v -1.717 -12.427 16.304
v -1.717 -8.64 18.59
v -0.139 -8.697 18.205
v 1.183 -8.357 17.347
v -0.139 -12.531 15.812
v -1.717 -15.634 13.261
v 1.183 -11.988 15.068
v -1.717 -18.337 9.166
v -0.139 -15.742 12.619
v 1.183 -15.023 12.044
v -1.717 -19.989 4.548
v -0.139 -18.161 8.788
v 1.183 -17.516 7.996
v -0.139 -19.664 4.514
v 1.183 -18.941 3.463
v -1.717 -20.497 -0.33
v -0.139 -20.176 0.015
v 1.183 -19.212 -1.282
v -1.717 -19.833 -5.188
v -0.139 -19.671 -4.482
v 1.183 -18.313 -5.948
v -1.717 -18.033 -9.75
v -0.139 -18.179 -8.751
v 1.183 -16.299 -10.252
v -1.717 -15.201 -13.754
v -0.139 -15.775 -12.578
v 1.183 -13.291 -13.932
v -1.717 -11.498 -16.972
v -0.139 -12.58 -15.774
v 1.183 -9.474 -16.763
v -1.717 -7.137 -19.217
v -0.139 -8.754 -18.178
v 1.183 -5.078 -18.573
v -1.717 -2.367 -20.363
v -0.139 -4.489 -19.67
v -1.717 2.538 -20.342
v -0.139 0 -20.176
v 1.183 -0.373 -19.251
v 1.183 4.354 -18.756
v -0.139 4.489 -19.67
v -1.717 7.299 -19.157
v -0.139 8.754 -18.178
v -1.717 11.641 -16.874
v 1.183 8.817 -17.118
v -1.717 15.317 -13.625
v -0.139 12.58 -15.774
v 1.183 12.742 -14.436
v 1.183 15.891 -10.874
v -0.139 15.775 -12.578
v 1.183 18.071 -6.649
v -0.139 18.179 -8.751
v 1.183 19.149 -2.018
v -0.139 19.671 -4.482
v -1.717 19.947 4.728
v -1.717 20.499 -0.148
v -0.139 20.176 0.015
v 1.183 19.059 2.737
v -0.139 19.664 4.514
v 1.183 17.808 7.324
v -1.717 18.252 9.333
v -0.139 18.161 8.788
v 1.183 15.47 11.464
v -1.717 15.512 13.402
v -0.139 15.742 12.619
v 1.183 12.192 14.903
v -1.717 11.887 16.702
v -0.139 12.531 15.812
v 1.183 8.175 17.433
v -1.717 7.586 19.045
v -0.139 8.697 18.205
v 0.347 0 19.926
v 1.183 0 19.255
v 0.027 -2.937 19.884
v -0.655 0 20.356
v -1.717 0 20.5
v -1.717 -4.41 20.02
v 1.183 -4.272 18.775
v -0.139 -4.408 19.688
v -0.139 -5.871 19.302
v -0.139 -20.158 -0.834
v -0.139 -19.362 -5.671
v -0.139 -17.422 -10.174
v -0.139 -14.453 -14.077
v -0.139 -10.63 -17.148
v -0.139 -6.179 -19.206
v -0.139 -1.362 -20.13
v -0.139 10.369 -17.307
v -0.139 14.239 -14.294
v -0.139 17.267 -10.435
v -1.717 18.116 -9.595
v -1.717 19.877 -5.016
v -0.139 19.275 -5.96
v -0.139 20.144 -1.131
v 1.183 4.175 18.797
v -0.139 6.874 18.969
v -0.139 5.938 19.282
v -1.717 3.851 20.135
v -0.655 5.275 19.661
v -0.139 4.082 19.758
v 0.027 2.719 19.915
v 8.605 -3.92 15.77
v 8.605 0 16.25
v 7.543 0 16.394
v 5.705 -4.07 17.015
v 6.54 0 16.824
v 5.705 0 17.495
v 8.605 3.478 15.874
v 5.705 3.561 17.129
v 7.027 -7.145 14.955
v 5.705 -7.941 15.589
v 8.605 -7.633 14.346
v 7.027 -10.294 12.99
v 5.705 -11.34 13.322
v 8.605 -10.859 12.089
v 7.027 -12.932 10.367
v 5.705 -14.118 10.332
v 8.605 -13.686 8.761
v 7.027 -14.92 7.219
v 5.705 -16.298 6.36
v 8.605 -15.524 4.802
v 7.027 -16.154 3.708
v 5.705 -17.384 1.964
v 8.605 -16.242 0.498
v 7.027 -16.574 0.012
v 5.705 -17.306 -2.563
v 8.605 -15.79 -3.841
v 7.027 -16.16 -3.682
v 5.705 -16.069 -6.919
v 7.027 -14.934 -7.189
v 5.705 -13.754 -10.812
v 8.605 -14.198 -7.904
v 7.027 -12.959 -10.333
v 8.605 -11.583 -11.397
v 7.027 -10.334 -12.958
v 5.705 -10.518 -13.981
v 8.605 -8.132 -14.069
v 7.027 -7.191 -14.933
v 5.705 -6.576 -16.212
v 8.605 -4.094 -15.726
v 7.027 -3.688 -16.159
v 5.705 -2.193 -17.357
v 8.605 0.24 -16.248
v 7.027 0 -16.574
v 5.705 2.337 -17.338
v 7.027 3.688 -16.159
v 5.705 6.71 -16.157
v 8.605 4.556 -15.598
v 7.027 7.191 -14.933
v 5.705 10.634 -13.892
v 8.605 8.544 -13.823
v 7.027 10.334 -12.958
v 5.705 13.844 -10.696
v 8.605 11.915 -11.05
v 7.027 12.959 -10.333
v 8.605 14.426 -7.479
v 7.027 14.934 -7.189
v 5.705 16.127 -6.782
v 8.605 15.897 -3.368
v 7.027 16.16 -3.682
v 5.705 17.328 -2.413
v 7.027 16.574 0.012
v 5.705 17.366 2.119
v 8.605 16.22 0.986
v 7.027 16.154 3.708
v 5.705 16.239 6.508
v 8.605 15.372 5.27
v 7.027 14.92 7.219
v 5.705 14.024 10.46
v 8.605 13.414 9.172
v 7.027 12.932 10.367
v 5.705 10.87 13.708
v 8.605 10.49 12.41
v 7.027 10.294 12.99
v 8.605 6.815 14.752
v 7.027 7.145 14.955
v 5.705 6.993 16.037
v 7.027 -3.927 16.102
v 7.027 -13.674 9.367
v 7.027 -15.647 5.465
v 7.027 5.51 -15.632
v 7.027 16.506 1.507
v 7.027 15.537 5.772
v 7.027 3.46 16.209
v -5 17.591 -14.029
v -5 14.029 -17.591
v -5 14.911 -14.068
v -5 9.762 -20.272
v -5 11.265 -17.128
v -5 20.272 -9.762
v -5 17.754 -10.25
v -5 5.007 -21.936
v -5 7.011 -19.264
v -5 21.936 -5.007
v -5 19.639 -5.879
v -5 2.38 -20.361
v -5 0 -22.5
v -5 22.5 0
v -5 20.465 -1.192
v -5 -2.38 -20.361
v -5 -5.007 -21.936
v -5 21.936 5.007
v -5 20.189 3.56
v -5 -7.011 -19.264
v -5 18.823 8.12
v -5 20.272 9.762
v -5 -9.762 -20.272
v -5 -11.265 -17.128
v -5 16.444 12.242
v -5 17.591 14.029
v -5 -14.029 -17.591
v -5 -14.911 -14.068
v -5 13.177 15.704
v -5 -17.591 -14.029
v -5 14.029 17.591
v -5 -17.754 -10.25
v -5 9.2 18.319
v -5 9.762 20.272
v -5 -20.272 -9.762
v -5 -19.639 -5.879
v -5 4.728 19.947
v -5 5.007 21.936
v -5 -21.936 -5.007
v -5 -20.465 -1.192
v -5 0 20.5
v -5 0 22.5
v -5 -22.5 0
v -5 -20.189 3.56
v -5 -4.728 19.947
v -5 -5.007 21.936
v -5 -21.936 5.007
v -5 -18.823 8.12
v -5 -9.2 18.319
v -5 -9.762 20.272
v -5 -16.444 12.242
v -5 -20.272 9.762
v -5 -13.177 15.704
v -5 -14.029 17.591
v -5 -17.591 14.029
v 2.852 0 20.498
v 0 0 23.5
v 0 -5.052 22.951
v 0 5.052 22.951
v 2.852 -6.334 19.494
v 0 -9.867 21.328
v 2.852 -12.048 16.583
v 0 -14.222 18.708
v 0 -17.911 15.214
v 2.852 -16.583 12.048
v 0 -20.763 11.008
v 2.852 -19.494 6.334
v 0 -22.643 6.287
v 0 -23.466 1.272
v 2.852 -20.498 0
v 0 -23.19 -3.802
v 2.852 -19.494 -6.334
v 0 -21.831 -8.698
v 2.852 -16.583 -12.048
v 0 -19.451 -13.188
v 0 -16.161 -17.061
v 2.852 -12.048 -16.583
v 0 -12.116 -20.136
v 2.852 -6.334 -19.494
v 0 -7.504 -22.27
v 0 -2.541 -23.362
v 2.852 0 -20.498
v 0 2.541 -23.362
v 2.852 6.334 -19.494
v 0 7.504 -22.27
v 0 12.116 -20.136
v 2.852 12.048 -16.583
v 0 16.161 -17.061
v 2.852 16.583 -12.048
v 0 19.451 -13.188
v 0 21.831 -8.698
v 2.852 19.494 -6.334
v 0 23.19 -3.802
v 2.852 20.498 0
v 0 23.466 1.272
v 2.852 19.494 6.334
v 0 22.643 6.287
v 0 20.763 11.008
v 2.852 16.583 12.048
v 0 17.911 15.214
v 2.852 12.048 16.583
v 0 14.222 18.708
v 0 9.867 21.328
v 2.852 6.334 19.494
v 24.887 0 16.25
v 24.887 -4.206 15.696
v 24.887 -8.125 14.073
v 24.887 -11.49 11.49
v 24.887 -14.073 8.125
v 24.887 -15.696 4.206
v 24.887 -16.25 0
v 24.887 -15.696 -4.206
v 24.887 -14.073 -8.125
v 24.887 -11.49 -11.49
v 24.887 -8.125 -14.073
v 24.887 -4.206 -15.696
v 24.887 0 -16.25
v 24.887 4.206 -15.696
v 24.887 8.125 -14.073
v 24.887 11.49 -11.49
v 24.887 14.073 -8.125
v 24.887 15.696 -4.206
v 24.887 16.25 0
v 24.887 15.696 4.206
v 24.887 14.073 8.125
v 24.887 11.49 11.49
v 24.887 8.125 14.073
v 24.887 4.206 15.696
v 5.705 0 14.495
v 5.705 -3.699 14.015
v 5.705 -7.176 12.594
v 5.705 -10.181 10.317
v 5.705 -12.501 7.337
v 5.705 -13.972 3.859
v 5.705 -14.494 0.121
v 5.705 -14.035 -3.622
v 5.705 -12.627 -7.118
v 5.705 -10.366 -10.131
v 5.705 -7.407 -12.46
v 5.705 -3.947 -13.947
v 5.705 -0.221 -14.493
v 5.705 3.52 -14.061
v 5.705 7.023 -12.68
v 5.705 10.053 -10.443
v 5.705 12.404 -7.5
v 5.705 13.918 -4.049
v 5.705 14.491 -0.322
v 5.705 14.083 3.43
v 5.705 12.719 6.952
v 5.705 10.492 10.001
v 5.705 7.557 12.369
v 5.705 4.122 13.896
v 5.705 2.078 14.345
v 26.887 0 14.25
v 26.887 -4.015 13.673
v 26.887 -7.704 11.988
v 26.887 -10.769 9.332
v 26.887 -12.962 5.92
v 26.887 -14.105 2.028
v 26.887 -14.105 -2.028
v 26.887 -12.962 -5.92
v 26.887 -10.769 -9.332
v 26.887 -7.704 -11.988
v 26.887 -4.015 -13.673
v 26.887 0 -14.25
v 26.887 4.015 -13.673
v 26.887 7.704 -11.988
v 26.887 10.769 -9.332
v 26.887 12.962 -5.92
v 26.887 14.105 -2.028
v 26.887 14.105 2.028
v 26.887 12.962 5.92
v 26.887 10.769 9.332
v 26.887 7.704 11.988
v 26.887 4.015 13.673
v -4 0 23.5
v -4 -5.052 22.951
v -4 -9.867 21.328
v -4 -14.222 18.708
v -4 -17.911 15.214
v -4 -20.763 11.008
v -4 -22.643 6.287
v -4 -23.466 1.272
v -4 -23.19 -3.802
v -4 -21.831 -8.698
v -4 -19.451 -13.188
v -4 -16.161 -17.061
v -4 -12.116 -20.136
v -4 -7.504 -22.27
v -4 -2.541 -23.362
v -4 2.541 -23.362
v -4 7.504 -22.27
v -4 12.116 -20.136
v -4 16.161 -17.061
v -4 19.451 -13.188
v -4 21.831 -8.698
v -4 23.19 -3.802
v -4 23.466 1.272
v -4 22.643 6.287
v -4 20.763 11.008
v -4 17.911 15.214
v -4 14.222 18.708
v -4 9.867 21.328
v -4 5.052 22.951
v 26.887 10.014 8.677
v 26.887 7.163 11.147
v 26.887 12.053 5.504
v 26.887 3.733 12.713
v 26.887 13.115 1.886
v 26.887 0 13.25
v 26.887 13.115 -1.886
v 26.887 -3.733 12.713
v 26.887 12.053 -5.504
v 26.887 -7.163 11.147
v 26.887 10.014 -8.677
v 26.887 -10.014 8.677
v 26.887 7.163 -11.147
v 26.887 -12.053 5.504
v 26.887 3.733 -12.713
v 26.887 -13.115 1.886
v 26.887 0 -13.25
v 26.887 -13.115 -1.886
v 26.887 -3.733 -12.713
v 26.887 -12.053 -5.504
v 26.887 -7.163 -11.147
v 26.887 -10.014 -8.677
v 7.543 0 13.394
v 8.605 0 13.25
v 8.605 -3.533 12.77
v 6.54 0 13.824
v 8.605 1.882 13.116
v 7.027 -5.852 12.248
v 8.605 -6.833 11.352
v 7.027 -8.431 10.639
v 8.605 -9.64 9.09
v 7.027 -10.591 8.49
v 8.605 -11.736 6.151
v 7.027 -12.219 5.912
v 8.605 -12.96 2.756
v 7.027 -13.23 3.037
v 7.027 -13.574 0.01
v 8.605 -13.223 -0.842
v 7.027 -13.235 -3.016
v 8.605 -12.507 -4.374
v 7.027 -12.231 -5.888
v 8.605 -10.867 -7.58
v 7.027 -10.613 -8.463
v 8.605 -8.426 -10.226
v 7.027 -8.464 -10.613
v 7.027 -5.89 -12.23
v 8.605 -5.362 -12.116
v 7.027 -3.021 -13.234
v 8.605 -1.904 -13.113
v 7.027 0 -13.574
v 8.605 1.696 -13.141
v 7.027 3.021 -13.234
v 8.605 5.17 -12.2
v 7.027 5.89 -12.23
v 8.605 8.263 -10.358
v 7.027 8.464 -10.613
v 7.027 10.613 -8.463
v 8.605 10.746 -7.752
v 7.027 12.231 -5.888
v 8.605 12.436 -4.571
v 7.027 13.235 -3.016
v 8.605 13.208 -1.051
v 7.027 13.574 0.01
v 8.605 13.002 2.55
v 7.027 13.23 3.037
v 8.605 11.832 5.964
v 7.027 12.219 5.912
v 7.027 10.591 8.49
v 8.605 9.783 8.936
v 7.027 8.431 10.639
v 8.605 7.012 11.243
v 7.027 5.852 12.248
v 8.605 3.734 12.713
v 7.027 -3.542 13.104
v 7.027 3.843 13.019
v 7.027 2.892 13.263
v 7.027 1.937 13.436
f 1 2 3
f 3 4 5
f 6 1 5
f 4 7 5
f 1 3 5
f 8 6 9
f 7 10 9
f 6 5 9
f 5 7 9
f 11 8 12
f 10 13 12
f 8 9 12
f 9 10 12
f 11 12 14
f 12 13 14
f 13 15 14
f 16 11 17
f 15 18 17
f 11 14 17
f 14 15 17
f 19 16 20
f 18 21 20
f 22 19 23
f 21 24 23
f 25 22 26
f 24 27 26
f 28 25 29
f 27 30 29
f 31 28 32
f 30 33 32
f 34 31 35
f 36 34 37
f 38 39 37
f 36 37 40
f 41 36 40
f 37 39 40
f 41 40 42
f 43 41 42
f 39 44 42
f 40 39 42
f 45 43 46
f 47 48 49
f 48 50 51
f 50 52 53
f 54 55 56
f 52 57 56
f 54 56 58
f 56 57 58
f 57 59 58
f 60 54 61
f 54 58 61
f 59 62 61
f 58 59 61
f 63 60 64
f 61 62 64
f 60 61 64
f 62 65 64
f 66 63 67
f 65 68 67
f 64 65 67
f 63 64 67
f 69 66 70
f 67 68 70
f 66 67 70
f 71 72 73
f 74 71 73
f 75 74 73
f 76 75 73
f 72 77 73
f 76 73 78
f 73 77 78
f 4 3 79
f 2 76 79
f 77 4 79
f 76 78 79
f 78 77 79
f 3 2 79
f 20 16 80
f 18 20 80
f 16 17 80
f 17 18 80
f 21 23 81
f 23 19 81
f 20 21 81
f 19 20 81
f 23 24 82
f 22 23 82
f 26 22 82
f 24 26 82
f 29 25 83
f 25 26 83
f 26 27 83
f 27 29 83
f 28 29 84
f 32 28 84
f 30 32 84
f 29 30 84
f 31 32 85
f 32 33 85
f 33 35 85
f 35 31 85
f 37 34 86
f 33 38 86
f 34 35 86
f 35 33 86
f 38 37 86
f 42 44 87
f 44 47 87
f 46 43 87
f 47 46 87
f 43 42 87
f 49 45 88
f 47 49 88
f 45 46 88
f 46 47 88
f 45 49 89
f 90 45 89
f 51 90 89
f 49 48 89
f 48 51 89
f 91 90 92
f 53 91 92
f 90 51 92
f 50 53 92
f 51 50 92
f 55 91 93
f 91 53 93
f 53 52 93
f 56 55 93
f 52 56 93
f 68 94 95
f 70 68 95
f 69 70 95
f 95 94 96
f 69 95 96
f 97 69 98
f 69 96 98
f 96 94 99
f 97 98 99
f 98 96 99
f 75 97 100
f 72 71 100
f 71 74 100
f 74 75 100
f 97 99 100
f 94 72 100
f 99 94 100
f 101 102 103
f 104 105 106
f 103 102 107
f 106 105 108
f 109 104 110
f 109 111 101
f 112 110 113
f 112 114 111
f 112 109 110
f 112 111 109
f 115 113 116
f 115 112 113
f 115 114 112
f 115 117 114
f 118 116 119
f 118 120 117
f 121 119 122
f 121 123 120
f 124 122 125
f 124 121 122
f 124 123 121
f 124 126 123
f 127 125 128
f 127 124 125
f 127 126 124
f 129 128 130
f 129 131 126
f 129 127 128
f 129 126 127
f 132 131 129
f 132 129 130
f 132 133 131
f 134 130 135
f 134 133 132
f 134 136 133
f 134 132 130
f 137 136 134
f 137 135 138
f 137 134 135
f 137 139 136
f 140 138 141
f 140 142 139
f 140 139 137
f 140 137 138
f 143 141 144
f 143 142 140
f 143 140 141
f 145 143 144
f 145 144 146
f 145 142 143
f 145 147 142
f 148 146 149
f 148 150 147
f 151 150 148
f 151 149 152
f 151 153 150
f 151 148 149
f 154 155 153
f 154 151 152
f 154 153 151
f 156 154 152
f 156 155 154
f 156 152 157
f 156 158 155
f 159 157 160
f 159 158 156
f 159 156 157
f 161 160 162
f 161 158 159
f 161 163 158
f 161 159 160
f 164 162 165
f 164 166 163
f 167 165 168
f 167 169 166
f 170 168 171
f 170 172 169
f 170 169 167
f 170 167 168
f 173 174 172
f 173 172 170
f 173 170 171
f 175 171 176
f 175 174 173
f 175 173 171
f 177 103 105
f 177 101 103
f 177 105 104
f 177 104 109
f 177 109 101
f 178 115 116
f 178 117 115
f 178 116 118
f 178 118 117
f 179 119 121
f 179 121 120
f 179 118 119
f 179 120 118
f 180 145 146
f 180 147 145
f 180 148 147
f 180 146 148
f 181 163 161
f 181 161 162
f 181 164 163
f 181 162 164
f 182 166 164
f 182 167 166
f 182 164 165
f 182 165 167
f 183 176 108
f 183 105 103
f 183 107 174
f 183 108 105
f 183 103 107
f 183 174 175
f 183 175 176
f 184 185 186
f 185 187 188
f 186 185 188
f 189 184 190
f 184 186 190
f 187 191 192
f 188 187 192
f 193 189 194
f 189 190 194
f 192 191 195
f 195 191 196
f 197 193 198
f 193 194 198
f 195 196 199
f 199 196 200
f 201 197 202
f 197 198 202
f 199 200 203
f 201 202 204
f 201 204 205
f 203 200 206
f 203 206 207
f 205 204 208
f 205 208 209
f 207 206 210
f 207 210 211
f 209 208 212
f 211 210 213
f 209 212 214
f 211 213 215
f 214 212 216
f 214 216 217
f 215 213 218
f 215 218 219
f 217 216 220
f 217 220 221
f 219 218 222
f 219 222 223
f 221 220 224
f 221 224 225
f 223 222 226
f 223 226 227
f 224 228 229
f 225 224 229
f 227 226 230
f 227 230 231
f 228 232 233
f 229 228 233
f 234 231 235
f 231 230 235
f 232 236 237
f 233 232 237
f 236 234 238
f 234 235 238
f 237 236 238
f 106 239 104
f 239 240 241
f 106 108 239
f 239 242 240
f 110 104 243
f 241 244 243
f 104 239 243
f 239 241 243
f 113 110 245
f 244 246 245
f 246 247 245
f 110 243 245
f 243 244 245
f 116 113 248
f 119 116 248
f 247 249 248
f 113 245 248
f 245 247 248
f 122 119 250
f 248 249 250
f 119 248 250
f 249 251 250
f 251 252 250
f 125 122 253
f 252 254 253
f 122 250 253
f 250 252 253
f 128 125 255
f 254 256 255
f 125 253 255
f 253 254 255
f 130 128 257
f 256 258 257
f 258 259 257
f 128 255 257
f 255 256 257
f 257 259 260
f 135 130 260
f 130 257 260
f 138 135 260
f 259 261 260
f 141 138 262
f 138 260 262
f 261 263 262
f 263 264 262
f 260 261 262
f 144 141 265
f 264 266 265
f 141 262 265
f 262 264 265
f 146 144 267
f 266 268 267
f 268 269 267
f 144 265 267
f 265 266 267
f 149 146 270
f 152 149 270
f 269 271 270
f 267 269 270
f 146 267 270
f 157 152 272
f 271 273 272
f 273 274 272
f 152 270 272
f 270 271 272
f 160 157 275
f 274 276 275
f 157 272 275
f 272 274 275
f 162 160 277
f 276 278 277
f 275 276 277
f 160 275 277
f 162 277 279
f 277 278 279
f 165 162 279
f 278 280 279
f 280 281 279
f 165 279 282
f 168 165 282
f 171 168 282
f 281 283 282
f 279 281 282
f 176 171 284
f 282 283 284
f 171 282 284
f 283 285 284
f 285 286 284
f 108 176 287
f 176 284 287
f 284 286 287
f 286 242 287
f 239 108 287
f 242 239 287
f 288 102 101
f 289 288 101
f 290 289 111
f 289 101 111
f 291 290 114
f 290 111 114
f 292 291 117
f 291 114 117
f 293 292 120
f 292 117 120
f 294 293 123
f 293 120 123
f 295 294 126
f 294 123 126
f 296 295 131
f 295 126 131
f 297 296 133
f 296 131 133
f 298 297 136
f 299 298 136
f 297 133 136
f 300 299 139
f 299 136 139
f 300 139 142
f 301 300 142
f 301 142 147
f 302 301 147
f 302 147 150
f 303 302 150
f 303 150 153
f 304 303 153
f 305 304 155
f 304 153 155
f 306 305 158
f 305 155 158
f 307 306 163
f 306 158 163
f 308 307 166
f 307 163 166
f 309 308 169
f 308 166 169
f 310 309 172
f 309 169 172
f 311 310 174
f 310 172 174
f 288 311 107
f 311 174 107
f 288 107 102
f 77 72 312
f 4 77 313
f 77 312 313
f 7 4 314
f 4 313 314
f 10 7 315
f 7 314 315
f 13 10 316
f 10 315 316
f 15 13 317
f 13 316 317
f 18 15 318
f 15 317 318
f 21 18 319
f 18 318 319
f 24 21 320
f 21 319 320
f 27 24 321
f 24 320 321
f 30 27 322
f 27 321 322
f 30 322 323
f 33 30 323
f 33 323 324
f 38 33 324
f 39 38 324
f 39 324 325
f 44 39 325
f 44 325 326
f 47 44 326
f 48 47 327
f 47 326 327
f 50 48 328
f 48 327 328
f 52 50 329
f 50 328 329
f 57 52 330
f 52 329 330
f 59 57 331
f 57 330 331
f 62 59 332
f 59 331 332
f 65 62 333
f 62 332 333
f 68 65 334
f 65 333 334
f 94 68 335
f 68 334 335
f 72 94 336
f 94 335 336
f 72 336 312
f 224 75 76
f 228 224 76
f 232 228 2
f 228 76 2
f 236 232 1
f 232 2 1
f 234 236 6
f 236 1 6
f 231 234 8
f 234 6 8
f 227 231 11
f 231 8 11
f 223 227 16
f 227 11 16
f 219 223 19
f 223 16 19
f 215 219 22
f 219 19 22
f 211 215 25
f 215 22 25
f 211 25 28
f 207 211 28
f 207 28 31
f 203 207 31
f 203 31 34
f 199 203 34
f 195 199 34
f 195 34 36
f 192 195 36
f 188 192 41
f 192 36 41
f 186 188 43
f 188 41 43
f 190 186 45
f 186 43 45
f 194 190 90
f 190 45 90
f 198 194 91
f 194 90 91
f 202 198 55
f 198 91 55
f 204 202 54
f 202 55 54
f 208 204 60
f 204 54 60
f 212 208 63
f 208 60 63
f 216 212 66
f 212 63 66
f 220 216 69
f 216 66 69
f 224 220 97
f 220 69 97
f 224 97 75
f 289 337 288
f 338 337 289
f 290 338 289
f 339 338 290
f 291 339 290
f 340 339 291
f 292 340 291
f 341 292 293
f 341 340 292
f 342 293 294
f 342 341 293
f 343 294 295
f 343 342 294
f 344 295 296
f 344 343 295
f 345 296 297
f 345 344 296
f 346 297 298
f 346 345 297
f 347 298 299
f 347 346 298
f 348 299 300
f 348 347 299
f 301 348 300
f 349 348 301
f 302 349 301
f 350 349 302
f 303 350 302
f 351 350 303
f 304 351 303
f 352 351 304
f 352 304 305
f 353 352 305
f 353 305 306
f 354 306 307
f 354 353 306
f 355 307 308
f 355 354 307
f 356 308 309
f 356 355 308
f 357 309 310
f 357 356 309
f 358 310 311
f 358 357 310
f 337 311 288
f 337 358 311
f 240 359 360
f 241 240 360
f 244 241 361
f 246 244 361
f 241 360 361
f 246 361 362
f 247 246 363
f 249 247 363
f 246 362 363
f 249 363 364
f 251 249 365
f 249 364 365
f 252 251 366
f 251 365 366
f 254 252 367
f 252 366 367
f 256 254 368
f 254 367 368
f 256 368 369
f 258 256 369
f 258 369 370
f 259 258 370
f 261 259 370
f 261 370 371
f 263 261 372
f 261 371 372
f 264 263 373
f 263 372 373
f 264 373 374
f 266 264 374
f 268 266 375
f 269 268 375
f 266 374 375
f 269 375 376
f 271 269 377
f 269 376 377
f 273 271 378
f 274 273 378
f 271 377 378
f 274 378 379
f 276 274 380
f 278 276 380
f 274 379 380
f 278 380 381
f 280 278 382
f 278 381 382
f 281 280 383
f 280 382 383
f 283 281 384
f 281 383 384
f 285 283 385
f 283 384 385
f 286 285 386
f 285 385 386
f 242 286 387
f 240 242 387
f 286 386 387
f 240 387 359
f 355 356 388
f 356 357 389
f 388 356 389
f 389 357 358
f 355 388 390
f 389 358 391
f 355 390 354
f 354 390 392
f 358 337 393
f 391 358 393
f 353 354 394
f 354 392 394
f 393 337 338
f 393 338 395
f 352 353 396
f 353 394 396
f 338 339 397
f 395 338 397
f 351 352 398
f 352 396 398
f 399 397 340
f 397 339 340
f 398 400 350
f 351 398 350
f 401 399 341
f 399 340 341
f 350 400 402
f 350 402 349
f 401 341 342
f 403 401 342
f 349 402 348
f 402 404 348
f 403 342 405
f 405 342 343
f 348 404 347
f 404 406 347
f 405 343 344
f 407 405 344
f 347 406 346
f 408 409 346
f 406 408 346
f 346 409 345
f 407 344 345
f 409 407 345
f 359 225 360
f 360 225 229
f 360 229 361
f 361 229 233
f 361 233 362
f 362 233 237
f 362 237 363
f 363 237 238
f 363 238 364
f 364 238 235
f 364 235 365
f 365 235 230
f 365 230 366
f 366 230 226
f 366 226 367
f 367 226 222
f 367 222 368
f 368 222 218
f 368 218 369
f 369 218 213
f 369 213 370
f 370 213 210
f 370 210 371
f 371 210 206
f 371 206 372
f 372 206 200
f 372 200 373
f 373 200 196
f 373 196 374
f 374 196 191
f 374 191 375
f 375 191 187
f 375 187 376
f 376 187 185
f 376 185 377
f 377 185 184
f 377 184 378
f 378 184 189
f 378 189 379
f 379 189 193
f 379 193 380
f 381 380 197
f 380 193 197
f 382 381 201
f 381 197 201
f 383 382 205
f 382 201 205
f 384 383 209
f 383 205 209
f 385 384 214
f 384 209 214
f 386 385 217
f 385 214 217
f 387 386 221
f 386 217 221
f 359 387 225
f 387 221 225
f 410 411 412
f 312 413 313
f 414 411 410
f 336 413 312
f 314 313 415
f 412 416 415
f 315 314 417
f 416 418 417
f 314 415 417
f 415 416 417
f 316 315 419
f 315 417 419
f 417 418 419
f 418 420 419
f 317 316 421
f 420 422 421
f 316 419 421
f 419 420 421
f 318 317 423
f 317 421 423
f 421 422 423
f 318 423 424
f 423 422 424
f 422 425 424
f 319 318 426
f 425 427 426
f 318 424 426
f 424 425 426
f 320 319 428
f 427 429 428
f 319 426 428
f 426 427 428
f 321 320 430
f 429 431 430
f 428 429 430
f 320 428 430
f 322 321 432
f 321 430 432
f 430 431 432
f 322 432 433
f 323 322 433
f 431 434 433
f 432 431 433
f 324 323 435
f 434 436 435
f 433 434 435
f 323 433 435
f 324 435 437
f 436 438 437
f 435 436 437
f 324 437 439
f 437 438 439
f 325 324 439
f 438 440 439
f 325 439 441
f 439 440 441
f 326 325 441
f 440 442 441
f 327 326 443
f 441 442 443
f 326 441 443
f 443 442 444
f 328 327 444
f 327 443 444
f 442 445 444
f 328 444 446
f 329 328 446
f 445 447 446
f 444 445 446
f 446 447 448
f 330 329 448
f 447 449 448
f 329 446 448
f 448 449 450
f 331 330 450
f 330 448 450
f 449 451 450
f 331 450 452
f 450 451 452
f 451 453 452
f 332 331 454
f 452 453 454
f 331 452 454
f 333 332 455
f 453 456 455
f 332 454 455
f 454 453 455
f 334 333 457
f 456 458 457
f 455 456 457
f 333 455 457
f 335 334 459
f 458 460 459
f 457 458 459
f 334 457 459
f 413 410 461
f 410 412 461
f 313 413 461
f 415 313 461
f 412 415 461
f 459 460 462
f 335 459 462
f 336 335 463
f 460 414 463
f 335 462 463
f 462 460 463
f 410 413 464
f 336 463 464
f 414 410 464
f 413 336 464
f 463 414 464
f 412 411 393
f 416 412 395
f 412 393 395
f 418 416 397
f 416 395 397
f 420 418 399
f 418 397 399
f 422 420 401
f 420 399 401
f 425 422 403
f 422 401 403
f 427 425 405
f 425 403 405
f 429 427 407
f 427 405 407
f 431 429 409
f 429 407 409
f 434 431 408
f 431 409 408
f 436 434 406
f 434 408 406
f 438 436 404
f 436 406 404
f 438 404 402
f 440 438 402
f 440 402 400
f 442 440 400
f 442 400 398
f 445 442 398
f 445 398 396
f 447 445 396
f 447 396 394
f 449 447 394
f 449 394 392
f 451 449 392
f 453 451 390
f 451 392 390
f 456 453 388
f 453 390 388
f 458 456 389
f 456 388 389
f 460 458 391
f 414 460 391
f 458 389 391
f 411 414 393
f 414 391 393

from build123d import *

# Parameters (mm, degrees)
F2_SIZE = 1
F3_SIZE = 2
F4_R    = 4


with BuildPart() as f1:
    # F0 (on Front) → F1 (revolve)
    with BuildSketch(Plane.XZ):
        Polygon((0, 23.5), (-5, 23.5), (-5, 20.5), (0, 20.5), (6.887489, 13.25), (26.887489, 13.25), (26.887489, 16.25), (6.887489, 16.25), align=None)
    revolve(axis=Axis((9.662958, 0, 0), (1, 0, 0)))

    # F2
    f2_edges = [f1.edges().sort_by_distance(p)[0] for p in [
        (-5, 0, -23.5),
    ]]
    chamfer(f2_edges, length=F2_SIZE)

    # F3
    f3_edges = [f1.edges().sort_by_distance(p)[0] for p in [
        (26.887489, 0, -16.25),
    ]]
    chamfer(f3_edges, length=F3_SIZE)

    # F4
    f4_edges = [f1.edges().sort_by_distance(p)[0] for p in [
        (6.887489, 0, -16.25),
        (6.887489, 0, -13.25),
        (0, 0, -20.5),
    ]]
    fillet(f4_edges, radius=F4_R)


solid = f1.part
